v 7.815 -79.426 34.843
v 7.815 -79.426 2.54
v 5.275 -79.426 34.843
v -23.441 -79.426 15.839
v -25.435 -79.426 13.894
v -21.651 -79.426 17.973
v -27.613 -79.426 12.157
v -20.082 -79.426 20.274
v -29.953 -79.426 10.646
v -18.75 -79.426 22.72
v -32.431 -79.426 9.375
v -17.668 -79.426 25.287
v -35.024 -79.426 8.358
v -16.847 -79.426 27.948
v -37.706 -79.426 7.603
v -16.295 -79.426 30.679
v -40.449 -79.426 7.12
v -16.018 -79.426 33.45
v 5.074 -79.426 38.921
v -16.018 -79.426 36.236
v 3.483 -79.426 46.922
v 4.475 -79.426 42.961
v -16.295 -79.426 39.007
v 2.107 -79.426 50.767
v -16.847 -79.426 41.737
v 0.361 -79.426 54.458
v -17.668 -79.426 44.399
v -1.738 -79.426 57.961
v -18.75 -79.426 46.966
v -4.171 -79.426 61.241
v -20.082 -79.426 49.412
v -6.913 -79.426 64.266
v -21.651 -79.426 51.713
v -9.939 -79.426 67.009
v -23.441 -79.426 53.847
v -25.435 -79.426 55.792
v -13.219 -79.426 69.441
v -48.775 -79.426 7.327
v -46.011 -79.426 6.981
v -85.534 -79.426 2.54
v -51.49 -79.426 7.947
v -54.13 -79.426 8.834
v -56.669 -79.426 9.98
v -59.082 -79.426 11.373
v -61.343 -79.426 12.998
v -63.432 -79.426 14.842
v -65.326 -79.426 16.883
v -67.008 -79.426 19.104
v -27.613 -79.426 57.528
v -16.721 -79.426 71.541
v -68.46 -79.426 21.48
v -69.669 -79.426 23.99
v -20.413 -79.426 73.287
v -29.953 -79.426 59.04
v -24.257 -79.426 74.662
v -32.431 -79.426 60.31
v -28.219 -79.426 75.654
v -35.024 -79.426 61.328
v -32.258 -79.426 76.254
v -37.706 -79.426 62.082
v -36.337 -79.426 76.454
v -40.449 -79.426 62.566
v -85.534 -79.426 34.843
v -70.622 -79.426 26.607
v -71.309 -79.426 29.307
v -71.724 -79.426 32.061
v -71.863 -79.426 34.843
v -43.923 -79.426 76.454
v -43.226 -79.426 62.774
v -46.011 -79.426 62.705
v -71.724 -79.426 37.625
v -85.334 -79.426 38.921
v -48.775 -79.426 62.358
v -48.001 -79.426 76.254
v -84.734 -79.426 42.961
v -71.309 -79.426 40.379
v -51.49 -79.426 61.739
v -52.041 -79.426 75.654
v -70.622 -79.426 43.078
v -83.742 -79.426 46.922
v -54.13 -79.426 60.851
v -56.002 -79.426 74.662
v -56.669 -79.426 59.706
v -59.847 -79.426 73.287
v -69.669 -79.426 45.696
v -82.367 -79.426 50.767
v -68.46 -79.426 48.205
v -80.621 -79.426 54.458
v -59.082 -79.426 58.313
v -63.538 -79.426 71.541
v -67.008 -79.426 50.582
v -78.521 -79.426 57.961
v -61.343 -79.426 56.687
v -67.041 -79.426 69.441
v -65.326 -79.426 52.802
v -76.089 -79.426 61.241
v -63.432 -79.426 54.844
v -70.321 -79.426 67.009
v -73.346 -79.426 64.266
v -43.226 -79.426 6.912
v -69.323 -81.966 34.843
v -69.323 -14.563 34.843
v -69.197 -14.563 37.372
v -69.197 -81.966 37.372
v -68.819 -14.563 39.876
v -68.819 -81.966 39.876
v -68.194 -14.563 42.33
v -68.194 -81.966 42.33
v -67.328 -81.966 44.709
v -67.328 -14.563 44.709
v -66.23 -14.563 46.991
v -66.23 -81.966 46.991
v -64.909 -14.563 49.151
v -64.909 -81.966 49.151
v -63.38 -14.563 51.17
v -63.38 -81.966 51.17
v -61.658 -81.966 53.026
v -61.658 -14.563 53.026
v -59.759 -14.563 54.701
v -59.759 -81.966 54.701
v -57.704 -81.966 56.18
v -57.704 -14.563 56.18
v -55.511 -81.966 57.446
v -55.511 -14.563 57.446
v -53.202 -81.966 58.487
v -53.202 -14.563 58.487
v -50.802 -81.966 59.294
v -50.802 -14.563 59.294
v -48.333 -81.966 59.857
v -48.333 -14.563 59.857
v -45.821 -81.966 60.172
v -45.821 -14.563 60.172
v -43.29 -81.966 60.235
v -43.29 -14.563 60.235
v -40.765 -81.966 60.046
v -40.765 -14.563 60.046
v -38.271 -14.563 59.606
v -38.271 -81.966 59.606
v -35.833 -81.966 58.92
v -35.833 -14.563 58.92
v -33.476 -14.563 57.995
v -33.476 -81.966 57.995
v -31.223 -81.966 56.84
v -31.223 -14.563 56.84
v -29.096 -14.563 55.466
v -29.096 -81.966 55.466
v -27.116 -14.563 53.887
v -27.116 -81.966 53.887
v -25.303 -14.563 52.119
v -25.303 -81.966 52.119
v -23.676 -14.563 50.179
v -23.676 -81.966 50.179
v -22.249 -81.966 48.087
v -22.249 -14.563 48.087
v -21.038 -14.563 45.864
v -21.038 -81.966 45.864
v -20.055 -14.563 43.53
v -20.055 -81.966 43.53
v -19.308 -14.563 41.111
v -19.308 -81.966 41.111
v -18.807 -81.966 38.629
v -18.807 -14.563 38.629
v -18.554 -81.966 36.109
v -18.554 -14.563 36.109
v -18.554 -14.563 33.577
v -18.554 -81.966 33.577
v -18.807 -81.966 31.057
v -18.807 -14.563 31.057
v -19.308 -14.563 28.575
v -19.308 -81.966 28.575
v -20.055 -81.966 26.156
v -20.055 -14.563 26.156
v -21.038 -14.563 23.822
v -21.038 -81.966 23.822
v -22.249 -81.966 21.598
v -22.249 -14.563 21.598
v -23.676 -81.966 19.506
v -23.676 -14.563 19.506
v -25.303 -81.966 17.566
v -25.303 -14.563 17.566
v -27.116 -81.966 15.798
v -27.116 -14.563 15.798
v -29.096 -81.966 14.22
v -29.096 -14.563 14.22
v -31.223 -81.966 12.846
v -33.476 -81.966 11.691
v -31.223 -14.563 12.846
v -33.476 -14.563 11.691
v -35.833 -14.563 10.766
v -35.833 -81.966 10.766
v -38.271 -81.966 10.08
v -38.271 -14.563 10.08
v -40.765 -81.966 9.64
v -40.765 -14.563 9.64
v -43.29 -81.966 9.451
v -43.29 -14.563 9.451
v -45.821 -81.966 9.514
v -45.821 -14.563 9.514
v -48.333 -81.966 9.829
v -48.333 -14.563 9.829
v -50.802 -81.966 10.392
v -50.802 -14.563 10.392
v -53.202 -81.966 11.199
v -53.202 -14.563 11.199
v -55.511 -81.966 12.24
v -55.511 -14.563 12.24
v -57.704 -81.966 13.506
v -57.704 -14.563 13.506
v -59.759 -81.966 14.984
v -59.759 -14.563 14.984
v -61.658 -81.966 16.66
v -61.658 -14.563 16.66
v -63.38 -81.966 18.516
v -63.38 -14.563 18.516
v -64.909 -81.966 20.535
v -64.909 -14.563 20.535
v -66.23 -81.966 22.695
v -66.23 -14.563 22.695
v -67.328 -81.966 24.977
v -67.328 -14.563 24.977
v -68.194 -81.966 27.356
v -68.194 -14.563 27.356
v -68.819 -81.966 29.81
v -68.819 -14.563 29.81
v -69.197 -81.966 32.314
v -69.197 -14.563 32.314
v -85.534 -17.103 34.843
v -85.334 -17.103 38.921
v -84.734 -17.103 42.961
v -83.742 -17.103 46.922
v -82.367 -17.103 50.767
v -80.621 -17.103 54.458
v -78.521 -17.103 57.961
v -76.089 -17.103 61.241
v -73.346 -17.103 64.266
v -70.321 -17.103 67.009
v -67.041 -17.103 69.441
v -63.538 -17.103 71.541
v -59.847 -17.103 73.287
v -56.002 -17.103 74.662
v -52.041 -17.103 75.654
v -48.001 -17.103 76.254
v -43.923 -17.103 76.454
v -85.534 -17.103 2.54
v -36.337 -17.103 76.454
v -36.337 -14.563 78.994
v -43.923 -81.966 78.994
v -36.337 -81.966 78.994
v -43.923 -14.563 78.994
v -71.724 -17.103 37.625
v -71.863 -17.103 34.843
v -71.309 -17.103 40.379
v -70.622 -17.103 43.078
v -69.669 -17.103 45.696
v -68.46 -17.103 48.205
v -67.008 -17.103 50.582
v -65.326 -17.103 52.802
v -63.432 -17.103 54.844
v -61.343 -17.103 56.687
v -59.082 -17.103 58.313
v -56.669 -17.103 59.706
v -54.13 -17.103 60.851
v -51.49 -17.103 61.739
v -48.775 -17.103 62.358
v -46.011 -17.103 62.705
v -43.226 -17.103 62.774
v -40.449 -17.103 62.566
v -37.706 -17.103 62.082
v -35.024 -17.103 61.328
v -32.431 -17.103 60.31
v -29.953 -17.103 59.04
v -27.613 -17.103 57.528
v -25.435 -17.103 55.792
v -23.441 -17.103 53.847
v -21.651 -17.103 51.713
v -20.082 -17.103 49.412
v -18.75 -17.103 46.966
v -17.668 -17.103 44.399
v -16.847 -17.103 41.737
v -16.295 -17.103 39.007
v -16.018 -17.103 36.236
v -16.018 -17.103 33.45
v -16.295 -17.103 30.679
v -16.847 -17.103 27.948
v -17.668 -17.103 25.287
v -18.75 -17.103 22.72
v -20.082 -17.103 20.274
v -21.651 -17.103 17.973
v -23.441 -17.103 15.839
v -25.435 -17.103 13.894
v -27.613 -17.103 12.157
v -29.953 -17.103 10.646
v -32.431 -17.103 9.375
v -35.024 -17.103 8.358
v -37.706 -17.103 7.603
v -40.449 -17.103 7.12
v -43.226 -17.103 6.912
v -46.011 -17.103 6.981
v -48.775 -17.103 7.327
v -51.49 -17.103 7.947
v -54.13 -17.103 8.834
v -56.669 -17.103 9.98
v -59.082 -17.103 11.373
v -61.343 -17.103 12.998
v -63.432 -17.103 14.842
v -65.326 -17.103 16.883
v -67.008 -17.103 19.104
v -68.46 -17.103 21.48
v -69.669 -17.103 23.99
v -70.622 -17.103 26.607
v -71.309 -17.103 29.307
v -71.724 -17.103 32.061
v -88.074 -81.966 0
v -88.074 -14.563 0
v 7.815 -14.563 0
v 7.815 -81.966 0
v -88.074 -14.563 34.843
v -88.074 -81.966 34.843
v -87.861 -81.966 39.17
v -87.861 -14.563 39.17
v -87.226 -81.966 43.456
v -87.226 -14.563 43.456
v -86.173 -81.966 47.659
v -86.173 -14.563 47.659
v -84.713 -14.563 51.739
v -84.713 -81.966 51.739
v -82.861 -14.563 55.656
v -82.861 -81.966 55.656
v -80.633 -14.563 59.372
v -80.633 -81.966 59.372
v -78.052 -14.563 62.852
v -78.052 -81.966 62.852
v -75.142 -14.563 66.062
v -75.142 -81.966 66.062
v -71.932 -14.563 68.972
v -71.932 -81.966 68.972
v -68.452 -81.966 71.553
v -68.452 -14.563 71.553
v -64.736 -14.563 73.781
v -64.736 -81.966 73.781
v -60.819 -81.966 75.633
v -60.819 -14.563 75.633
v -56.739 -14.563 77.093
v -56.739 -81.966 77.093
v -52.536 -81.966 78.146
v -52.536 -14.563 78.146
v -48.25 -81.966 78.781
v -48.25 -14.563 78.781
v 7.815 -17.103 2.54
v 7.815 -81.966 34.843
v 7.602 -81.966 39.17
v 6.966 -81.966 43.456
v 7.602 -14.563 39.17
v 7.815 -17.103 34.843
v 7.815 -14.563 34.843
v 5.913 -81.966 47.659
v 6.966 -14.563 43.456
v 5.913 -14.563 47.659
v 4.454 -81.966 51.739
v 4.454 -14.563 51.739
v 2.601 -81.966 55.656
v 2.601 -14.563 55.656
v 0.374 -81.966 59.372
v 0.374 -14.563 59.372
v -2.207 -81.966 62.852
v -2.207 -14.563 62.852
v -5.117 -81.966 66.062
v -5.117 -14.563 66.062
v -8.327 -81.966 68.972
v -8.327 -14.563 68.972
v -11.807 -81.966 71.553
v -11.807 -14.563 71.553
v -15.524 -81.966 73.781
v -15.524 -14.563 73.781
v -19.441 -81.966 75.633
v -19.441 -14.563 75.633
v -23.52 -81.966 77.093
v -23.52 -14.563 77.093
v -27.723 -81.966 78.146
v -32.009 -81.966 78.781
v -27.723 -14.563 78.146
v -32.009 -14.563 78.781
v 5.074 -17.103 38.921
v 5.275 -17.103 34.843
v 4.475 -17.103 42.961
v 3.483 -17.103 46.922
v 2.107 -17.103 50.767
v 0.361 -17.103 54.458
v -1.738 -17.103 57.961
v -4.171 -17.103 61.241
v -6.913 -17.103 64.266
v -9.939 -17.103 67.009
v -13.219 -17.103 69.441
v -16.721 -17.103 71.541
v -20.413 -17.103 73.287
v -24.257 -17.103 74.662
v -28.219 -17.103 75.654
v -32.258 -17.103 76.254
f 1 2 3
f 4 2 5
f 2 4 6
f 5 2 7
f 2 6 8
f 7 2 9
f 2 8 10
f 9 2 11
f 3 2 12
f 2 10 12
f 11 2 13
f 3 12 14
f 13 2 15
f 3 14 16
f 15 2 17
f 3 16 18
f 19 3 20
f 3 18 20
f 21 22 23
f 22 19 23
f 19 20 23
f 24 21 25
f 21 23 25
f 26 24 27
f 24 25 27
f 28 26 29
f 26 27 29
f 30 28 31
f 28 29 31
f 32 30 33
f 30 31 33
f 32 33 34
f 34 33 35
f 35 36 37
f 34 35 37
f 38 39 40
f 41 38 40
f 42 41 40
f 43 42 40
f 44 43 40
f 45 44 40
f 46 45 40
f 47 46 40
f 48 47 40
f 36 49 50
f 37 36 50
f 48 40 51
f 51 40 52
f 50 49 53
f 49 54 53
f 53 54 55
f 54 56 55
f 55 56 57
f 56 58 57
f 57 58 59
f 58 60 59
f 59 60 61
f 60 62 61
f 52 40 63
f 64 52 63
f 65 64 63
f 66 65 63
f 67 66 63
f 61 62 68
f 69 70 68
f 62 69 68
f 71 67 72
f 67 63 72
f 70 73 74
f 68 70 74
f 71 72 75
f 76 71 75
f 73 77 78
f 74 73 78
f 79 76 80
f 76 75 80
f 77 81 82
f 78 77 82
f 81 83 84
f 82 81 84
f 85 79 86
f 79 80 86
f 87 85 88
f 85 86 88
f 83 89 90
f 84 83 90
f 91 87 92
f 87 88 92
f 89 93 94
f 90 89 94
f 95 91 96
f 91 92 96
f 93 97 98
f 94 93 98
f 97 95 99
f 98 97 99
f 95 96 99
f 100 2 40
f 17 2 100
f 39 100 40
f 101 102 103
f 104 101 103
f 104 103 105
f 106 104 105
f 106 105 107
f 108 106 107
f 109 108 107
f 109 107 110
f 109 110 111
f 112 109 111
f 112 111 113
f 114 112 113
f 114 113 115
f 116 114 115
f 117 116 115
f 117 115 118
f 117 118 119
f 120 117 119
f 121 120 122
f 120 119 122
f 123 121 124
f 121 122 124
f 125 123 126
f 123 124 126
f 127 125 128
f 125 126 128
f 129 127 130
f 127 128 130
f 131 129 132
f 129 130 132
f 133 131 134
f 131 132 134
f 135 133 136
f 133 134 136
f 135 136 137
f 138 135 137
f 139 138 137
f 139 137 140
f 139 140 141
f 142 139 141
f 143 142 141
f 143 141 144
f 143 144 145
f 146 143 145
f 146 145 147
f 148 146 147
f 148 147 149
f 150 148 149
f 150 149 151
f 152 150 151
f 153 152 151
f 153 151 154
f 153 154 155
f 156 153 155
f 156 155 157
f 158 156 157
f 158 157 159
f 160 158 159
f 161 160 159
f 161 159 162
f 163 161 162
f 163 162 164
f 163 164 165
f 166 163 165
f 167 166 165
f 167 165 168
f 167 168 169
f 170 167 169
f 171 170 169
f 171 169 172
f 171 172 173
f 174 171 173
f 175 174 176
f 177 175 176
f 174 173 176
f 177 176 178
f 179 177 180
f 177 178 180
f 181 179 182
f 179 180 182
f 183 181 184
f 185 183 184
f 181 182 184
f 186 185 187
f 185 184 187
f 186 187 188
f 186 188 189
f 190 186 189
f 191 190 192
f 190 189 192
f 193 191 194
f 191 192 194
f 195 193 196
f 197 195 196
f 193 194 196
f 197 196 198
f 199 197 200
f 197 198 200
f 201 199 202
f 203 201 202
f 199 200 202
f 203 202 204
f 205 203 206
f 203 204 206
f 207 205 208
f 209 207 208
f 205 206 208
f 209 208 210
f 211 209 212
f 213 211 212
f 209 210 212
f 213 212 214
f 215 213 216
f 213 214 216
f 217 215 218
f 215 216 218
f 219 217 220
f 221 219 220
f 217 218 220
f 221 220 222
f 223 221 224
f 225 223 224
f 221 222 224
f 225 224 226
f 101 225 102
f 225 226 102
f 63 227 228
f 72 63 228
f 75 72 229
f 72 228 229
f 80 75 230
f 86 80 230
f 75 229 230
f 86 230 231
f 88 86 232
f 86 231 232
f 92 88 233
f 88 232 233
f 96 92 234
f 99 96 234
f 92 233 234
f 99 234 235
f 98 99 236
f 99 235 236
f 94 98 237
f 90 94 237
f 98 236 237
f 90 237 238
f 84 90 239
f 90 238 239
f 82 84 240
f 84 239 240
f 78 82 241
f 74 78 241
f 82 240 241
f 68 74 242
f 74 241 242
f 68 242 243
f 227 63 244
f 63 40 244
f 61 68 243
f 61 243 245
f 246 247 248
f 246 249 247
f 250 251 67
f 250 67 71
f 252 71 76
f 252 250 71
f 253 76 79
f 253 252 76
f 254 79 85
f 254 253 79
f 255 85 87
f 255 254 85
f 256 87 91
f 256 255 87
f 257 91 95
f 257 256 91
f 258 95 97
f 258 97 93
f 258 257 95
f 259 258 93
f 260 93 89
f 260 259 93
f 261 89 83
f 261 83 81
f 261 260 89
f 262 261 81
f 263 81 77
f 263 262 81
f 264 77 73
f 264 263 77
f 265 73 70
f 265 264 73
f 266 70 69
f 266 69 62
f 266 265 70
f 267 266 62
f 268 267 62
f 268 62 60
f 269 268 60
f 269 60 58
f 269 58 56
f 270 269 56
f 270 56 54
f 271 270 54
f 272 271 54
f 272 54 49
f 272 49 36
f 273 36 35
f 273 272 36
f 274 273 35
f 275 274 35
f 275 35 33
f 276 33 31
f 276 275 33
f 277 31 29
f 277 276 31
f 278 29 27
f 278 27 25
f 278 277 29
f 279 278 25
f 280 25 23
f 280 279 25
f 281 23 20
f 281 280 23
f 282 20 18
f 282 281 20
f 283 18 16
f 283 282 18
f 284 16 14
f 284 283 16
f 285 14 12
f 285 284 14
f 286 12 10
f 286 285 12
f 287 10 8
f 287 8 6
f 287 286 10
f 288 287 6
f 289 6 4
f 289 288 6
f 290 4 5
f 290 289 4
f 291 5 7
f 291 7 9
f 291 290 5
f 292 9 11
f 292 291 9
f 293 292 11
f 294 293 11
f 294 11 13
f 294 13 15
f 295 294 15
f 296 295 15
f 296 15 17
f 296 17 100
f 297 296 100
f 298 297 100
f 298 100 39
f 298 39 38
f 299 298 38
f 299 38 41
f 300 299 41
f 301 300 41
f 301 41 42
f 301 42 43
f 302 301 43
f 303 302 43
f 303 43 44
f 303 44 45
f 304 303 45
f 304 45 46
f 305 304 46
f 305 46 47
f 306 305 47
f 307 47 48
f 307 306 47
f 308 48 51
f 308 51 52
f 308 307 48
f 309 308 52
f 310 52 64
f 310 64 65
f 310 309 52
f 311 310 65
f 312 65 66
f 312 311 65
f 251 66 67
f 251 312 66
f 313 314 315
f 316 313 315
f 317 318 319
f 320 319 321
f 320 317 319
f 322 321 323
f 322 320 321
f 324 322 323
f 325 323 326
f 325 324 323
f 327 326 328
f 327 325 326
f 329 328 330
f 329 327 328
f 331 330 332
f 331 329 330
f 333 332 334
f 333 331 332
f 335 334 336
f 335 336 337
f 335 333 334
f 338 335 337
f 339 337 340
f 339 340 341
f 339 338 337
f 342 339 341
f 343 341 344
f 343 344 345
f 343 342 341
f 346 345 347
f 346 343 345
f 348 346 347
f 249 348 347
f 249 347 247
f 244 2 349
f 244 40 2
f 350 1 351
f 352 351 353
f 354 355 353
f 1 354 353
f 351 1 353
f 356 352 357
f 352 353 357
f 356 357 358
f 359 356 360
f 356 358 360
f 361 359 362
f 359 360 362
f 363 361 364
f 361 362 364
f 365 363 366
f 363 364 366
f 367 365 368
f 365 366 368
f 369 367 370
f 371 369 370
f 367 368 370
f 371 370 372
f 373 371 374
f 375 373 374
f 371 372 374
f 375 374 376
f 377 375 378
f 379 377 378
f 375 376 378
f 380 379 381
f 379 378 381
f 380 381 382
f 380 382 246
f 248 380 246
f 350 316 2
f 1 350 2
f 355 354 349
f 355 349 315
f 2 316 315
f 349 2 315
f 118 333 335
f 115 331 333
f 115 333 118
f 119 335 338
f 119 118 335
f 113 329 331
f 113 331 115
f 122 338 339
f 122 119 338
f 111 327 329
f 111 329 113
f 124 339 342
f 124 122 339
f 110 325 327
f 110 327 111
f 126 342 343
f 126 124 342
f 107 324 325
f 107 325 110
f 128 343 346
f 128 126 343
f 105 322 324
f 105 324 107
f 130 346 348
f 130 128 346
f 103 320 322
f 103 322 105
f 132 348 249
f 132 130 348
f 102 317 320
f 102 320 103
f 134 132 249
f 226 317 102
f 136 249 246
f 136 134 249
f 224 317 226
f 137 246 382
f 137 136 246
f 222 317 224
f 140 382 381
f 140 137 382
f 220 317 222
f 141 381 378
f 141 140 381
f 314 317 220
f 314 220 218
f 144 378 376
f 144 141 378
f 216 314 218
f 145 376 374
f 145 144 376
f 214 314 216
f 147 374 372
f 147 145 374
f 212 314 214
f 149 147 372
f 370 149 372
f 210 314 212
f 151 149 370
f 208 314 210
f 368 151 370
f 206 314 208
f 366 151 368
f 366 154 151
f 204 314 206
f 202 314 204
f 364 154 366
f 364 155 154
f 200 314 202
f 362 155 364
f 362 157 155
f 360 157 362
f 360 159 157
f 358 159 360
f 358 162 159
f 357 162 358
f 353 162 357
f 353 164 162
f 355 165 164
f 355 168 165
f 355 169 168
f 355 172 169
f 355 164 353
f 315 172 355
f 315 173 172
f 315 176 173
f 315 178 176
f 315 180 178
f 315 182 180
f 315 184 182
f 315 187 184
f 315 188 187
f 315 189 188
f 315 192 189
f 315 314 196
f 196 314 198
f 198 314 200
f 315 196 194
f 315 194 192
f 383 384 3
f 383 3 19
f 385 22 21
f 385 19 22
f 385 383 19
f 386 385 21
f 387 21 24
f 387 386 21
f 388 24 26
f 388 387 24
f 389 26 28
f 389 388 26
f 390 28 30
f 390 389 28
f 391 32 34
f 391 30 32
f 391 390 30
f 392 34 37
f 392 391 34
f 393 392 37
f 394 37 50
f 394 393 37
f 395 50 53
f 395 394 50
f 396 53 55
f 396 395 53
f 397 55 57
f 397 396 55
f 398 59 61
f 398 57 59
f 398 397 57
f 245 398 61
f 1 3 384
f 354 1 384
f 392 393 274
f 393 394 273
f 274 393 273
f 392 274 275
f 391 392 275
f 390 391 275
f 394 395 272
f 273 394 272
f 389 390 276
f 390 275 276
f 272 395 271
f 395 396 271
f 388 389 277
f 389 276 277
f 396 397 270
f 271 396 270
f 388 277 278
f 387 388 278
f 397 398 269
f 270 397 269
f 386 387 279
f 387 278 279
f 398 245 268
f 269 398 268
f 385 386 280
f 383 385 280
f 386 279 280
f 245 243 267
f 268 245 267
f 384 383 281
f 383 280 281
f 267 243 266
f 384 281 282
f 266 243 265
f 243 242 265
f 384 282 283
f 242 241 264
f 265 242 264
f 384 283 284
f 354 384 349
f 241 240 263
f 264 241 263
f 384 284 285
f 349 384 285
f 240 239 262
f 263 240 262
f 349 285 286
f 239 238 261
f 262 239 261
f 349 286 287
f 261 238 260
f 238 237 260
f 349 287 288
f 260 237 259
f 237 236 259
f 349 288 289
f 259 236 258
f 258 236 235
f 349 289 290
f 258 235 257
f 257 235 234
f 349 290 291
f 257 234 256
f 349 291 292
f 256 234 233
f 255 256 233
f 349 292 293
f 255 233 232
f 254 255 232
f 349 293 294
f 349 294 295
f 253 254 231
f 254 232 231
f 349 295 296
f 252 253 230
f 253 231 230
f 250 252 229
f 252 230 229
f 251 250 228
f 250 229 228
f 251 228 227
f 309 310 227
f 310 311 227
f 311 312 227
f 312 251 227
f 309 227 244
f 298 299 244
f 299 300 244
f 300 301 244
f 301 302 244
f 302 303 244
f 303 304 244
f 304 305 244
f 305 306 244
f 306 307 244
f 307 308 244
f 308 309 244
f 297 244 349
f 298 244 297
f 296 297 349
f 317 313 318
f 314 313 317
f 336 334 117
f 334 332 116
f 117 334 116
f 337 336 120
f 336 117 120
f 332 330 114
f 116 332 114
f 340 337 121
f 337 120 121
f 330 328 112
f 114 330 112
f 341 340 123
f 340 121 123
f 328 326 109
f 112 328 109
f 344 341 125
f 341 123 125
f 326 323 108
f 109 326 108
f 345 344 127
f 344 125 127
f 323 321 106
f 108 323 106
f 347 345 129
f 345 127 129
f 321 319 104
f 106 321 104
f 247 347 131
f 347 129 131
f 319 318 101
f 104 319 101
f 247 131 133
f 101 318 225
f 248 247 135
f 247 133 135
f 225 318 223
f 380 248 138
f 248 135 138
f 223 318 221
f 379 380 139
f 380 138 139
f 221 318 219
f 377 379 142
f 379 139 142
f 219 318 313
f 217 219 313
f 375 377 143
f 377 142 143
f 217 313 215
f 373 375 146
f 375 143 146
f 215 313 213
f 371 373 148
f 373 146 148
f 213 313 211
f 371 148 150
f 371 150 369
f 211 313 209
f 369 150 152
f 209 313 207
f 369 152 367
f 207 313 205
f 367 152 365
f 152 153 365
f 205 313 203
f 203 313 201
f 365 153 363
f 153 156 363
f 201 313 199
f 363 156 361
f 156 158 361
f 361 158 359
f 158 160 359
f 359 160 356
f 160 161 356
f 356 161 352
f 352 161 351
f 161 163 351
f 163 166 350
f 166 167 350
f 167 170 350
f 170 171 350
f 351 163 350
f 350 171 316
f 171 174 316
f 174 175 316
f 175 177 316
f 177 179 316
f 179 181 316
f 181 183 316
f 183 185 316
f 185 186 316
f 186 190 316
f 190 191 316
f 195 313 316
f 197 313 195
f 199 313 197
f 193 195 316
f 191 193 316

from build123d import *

# Parameters (mm, degrees)
F0_W     = 95.8885699511
F0_H     = 67.4029458314
F1_DEPTH = 78.994
F2_R     = 44.1511376287
F4_D     = 50.8
F5_T     = -2.54


# Not quite as in the source:
# - a shell that OpenCascade refuses in one call is made with other operations: the cavity is built on its own and cut out


with BuildPart() as f1:
    # F0 (on Top) → F1 (new body)
    with BuildSketch(Plane.XY):
        with Locations((-40.1296839118, -48.2643311843)):
            Rectangle(F0_W, F0_H)
    extrude(amount=F1_DEPTH)

    # F2
    f2_edges = [f1.edges().sort_by_distance(p)[0] for p in [
        (-88.073969, -48.264331, 78.994),
        (7.814601, -48.264331, 78.994),
    ]]
    fillet(f2_edges, radius=F2_R)

    # F4 (through all)
    with Locations(Plane.XZ.offset(81.9658041)):
        with Locations((-43.9228312586, 34.8428623713)):
            Hole(F4_D / 2)

    # F5: a shell. OpenCascade refuses it in one call, so the cavity is built on its own and cut out:
    # the body offset inwards by the wall thickness, plus a prism from it out through each open face.
    f5_core = offset(f1.part, amount=F5_T, mode=Mode.PRIVATE)
    f5_exits = [f5_core.faces().sort_by_distance(p)[0] for p in [
        (5.274601, -48.264331, 18.691431),
    ]]
    add(f5_core, mode=Mode.SUBTRACT)
    extrude(f5_exits, amount=-F5_T, mode=Mode.SUBTRACT)


solid = f1.part
